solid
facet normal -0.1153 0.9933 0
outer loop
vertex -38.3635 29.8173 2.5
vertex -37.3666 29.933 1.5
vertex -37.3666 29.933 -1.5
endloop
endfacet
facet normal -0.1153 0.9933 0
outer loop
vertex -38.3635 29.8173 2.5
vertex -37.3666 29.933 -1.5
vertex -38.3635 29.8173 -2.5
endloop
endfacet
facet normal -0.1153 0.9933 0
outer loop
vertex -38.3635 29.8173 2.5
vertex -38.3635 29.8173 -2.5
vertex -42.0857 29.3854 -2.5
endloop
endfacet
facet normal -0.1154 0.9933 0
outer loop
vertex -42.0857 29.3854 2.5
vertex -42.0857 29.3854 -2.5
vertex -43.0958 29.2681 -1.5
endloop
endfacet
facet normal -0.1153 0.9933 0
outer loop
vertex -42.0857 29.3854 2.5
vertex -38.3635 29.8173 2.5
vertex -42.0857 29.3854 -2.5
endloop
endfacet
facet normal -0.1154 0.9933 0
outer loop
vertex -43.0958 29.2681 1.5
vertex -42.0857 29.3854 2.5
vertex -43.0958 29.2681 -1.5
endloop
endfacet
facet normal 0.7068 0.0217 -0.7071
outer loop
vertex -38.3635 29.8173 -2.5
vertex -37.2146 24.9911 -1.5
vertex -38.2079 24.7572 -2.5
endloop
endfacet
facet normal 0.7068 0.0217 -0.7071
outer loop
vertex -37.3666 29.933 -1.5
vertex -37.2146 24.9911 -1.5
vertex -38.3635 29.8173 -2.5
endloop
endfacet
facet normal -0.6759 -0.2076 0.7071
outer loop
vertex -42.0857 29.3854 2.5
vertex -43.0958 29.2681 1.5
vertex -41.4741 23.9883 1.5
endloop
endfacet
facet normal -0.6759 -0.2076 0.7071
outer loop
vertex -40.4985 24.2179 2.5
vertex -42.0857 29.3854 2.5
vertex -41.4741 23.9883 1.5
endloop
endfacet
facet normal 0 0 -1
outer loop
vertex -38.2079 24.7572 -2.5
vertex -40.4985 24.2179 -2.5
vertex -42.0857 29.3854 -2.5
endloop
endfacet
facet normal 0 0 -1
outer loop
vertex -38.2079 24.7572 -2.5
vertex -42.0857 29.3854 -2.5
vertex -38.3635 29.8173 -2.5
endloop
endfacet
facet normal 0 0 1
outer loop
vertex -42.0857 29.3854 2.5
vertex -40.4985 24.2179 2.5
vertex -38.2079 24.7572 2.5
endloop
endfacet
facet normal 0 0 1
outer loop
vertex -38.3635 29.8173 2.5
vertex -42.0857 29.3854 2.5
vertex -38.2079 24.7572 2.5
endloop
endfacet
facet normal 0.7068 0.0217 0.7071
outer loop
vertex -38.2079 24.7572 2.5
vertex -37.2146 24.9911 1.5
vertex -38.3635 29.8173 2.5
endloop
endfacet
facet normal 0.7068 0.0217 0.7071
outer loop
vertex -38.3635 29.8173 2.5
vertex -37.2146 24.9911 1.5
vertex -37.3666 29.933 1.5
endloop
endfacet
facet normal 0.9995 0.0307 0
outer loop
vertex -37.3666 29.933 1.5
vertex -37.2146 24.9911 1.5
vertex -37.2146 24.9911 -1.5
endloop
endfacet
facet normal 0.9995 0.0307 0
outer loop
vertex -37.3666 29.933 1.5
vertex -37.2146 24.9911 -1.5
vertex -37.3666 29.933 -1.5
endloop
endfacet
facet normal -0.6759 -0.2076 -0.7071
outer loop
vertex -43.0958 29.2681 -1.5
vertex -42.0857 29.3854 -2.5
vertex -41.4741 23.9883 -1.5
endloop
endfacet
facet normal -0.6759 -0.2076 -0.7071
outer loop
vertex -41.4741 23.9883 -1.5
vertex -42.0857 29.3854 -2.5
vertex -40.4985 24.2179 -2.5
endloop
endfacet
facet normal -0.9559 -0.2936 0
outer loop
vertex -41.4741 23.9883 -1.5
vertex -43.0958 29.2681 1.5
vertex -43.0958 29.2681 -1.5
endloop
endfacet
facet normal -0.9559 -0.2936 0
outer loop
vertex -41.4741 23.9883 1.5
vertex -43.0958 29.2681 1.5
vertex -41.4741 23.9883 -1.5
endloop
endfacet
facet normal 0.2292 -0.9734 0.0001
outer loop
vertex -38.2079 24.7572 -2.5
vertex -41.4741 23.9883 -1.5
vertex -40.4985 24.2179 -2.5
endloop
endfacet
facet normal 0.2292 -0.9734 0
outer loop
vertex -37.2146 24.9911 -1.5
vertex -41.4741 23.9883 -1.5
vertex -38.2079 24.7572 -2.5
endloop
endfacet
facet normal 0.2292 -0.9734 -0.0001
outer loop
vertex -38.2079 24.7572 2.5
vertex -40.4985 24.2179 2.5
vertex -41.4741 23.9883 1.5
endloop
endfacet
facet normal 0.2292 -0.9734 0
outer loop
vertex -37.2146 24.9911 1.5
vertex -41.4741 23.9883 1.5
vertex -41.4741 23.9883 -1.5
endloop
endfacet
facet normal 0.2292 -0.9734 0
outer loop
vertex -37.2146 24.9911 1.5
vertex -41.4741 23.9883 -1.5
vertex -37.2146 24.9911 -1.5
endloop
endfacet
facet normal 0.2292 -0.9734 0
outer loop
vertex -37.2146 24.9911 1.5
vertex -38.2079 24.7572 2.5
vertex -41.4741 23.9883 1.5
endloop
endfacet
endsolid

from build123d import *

# Parameters (mm, degrees)
PAD005_DEPTH    = 2.5
CHAMFER003_SIZE = 1


with BuildPart() as knubbel_stirn:
    # Sketch → Pad005 (new body, symmetric)
    with BuildSketch(Plane.XY):
        Polygon((37.36659, 29.932996), (43.095788, 29.268148), (41.474087, 23.988274), (37.214632, 24.991065), align=None)
    extrude(amount=PAD005_DEPTH, both=True)

    # Chamfer003
    chamfer003_edges = [knubbel_stirn.edges().sort_by_distance(p)[0] for p in [
        (42.284938, 26.628211, 2.5),
        (37.290611, 27.46203, 2.5),
        (42.284938, 26.628211, -2.5),
        (37.290611, 27.46203, -2.5),
    ]]
    chamfer(chamfer003_edges, length=CHAMFER003_SIZE)


with BuildPart() as part_mirroring001:
    # Part__Mirroring001: instance of Knubbel_Stirn
    add(knubbel_stirn.part.mirror(Plane(origin=(0, 0, 0), x_dir=(0, -1, 0), z_dir=(1, 0, 0))))


solid = part_mirroring001.part
